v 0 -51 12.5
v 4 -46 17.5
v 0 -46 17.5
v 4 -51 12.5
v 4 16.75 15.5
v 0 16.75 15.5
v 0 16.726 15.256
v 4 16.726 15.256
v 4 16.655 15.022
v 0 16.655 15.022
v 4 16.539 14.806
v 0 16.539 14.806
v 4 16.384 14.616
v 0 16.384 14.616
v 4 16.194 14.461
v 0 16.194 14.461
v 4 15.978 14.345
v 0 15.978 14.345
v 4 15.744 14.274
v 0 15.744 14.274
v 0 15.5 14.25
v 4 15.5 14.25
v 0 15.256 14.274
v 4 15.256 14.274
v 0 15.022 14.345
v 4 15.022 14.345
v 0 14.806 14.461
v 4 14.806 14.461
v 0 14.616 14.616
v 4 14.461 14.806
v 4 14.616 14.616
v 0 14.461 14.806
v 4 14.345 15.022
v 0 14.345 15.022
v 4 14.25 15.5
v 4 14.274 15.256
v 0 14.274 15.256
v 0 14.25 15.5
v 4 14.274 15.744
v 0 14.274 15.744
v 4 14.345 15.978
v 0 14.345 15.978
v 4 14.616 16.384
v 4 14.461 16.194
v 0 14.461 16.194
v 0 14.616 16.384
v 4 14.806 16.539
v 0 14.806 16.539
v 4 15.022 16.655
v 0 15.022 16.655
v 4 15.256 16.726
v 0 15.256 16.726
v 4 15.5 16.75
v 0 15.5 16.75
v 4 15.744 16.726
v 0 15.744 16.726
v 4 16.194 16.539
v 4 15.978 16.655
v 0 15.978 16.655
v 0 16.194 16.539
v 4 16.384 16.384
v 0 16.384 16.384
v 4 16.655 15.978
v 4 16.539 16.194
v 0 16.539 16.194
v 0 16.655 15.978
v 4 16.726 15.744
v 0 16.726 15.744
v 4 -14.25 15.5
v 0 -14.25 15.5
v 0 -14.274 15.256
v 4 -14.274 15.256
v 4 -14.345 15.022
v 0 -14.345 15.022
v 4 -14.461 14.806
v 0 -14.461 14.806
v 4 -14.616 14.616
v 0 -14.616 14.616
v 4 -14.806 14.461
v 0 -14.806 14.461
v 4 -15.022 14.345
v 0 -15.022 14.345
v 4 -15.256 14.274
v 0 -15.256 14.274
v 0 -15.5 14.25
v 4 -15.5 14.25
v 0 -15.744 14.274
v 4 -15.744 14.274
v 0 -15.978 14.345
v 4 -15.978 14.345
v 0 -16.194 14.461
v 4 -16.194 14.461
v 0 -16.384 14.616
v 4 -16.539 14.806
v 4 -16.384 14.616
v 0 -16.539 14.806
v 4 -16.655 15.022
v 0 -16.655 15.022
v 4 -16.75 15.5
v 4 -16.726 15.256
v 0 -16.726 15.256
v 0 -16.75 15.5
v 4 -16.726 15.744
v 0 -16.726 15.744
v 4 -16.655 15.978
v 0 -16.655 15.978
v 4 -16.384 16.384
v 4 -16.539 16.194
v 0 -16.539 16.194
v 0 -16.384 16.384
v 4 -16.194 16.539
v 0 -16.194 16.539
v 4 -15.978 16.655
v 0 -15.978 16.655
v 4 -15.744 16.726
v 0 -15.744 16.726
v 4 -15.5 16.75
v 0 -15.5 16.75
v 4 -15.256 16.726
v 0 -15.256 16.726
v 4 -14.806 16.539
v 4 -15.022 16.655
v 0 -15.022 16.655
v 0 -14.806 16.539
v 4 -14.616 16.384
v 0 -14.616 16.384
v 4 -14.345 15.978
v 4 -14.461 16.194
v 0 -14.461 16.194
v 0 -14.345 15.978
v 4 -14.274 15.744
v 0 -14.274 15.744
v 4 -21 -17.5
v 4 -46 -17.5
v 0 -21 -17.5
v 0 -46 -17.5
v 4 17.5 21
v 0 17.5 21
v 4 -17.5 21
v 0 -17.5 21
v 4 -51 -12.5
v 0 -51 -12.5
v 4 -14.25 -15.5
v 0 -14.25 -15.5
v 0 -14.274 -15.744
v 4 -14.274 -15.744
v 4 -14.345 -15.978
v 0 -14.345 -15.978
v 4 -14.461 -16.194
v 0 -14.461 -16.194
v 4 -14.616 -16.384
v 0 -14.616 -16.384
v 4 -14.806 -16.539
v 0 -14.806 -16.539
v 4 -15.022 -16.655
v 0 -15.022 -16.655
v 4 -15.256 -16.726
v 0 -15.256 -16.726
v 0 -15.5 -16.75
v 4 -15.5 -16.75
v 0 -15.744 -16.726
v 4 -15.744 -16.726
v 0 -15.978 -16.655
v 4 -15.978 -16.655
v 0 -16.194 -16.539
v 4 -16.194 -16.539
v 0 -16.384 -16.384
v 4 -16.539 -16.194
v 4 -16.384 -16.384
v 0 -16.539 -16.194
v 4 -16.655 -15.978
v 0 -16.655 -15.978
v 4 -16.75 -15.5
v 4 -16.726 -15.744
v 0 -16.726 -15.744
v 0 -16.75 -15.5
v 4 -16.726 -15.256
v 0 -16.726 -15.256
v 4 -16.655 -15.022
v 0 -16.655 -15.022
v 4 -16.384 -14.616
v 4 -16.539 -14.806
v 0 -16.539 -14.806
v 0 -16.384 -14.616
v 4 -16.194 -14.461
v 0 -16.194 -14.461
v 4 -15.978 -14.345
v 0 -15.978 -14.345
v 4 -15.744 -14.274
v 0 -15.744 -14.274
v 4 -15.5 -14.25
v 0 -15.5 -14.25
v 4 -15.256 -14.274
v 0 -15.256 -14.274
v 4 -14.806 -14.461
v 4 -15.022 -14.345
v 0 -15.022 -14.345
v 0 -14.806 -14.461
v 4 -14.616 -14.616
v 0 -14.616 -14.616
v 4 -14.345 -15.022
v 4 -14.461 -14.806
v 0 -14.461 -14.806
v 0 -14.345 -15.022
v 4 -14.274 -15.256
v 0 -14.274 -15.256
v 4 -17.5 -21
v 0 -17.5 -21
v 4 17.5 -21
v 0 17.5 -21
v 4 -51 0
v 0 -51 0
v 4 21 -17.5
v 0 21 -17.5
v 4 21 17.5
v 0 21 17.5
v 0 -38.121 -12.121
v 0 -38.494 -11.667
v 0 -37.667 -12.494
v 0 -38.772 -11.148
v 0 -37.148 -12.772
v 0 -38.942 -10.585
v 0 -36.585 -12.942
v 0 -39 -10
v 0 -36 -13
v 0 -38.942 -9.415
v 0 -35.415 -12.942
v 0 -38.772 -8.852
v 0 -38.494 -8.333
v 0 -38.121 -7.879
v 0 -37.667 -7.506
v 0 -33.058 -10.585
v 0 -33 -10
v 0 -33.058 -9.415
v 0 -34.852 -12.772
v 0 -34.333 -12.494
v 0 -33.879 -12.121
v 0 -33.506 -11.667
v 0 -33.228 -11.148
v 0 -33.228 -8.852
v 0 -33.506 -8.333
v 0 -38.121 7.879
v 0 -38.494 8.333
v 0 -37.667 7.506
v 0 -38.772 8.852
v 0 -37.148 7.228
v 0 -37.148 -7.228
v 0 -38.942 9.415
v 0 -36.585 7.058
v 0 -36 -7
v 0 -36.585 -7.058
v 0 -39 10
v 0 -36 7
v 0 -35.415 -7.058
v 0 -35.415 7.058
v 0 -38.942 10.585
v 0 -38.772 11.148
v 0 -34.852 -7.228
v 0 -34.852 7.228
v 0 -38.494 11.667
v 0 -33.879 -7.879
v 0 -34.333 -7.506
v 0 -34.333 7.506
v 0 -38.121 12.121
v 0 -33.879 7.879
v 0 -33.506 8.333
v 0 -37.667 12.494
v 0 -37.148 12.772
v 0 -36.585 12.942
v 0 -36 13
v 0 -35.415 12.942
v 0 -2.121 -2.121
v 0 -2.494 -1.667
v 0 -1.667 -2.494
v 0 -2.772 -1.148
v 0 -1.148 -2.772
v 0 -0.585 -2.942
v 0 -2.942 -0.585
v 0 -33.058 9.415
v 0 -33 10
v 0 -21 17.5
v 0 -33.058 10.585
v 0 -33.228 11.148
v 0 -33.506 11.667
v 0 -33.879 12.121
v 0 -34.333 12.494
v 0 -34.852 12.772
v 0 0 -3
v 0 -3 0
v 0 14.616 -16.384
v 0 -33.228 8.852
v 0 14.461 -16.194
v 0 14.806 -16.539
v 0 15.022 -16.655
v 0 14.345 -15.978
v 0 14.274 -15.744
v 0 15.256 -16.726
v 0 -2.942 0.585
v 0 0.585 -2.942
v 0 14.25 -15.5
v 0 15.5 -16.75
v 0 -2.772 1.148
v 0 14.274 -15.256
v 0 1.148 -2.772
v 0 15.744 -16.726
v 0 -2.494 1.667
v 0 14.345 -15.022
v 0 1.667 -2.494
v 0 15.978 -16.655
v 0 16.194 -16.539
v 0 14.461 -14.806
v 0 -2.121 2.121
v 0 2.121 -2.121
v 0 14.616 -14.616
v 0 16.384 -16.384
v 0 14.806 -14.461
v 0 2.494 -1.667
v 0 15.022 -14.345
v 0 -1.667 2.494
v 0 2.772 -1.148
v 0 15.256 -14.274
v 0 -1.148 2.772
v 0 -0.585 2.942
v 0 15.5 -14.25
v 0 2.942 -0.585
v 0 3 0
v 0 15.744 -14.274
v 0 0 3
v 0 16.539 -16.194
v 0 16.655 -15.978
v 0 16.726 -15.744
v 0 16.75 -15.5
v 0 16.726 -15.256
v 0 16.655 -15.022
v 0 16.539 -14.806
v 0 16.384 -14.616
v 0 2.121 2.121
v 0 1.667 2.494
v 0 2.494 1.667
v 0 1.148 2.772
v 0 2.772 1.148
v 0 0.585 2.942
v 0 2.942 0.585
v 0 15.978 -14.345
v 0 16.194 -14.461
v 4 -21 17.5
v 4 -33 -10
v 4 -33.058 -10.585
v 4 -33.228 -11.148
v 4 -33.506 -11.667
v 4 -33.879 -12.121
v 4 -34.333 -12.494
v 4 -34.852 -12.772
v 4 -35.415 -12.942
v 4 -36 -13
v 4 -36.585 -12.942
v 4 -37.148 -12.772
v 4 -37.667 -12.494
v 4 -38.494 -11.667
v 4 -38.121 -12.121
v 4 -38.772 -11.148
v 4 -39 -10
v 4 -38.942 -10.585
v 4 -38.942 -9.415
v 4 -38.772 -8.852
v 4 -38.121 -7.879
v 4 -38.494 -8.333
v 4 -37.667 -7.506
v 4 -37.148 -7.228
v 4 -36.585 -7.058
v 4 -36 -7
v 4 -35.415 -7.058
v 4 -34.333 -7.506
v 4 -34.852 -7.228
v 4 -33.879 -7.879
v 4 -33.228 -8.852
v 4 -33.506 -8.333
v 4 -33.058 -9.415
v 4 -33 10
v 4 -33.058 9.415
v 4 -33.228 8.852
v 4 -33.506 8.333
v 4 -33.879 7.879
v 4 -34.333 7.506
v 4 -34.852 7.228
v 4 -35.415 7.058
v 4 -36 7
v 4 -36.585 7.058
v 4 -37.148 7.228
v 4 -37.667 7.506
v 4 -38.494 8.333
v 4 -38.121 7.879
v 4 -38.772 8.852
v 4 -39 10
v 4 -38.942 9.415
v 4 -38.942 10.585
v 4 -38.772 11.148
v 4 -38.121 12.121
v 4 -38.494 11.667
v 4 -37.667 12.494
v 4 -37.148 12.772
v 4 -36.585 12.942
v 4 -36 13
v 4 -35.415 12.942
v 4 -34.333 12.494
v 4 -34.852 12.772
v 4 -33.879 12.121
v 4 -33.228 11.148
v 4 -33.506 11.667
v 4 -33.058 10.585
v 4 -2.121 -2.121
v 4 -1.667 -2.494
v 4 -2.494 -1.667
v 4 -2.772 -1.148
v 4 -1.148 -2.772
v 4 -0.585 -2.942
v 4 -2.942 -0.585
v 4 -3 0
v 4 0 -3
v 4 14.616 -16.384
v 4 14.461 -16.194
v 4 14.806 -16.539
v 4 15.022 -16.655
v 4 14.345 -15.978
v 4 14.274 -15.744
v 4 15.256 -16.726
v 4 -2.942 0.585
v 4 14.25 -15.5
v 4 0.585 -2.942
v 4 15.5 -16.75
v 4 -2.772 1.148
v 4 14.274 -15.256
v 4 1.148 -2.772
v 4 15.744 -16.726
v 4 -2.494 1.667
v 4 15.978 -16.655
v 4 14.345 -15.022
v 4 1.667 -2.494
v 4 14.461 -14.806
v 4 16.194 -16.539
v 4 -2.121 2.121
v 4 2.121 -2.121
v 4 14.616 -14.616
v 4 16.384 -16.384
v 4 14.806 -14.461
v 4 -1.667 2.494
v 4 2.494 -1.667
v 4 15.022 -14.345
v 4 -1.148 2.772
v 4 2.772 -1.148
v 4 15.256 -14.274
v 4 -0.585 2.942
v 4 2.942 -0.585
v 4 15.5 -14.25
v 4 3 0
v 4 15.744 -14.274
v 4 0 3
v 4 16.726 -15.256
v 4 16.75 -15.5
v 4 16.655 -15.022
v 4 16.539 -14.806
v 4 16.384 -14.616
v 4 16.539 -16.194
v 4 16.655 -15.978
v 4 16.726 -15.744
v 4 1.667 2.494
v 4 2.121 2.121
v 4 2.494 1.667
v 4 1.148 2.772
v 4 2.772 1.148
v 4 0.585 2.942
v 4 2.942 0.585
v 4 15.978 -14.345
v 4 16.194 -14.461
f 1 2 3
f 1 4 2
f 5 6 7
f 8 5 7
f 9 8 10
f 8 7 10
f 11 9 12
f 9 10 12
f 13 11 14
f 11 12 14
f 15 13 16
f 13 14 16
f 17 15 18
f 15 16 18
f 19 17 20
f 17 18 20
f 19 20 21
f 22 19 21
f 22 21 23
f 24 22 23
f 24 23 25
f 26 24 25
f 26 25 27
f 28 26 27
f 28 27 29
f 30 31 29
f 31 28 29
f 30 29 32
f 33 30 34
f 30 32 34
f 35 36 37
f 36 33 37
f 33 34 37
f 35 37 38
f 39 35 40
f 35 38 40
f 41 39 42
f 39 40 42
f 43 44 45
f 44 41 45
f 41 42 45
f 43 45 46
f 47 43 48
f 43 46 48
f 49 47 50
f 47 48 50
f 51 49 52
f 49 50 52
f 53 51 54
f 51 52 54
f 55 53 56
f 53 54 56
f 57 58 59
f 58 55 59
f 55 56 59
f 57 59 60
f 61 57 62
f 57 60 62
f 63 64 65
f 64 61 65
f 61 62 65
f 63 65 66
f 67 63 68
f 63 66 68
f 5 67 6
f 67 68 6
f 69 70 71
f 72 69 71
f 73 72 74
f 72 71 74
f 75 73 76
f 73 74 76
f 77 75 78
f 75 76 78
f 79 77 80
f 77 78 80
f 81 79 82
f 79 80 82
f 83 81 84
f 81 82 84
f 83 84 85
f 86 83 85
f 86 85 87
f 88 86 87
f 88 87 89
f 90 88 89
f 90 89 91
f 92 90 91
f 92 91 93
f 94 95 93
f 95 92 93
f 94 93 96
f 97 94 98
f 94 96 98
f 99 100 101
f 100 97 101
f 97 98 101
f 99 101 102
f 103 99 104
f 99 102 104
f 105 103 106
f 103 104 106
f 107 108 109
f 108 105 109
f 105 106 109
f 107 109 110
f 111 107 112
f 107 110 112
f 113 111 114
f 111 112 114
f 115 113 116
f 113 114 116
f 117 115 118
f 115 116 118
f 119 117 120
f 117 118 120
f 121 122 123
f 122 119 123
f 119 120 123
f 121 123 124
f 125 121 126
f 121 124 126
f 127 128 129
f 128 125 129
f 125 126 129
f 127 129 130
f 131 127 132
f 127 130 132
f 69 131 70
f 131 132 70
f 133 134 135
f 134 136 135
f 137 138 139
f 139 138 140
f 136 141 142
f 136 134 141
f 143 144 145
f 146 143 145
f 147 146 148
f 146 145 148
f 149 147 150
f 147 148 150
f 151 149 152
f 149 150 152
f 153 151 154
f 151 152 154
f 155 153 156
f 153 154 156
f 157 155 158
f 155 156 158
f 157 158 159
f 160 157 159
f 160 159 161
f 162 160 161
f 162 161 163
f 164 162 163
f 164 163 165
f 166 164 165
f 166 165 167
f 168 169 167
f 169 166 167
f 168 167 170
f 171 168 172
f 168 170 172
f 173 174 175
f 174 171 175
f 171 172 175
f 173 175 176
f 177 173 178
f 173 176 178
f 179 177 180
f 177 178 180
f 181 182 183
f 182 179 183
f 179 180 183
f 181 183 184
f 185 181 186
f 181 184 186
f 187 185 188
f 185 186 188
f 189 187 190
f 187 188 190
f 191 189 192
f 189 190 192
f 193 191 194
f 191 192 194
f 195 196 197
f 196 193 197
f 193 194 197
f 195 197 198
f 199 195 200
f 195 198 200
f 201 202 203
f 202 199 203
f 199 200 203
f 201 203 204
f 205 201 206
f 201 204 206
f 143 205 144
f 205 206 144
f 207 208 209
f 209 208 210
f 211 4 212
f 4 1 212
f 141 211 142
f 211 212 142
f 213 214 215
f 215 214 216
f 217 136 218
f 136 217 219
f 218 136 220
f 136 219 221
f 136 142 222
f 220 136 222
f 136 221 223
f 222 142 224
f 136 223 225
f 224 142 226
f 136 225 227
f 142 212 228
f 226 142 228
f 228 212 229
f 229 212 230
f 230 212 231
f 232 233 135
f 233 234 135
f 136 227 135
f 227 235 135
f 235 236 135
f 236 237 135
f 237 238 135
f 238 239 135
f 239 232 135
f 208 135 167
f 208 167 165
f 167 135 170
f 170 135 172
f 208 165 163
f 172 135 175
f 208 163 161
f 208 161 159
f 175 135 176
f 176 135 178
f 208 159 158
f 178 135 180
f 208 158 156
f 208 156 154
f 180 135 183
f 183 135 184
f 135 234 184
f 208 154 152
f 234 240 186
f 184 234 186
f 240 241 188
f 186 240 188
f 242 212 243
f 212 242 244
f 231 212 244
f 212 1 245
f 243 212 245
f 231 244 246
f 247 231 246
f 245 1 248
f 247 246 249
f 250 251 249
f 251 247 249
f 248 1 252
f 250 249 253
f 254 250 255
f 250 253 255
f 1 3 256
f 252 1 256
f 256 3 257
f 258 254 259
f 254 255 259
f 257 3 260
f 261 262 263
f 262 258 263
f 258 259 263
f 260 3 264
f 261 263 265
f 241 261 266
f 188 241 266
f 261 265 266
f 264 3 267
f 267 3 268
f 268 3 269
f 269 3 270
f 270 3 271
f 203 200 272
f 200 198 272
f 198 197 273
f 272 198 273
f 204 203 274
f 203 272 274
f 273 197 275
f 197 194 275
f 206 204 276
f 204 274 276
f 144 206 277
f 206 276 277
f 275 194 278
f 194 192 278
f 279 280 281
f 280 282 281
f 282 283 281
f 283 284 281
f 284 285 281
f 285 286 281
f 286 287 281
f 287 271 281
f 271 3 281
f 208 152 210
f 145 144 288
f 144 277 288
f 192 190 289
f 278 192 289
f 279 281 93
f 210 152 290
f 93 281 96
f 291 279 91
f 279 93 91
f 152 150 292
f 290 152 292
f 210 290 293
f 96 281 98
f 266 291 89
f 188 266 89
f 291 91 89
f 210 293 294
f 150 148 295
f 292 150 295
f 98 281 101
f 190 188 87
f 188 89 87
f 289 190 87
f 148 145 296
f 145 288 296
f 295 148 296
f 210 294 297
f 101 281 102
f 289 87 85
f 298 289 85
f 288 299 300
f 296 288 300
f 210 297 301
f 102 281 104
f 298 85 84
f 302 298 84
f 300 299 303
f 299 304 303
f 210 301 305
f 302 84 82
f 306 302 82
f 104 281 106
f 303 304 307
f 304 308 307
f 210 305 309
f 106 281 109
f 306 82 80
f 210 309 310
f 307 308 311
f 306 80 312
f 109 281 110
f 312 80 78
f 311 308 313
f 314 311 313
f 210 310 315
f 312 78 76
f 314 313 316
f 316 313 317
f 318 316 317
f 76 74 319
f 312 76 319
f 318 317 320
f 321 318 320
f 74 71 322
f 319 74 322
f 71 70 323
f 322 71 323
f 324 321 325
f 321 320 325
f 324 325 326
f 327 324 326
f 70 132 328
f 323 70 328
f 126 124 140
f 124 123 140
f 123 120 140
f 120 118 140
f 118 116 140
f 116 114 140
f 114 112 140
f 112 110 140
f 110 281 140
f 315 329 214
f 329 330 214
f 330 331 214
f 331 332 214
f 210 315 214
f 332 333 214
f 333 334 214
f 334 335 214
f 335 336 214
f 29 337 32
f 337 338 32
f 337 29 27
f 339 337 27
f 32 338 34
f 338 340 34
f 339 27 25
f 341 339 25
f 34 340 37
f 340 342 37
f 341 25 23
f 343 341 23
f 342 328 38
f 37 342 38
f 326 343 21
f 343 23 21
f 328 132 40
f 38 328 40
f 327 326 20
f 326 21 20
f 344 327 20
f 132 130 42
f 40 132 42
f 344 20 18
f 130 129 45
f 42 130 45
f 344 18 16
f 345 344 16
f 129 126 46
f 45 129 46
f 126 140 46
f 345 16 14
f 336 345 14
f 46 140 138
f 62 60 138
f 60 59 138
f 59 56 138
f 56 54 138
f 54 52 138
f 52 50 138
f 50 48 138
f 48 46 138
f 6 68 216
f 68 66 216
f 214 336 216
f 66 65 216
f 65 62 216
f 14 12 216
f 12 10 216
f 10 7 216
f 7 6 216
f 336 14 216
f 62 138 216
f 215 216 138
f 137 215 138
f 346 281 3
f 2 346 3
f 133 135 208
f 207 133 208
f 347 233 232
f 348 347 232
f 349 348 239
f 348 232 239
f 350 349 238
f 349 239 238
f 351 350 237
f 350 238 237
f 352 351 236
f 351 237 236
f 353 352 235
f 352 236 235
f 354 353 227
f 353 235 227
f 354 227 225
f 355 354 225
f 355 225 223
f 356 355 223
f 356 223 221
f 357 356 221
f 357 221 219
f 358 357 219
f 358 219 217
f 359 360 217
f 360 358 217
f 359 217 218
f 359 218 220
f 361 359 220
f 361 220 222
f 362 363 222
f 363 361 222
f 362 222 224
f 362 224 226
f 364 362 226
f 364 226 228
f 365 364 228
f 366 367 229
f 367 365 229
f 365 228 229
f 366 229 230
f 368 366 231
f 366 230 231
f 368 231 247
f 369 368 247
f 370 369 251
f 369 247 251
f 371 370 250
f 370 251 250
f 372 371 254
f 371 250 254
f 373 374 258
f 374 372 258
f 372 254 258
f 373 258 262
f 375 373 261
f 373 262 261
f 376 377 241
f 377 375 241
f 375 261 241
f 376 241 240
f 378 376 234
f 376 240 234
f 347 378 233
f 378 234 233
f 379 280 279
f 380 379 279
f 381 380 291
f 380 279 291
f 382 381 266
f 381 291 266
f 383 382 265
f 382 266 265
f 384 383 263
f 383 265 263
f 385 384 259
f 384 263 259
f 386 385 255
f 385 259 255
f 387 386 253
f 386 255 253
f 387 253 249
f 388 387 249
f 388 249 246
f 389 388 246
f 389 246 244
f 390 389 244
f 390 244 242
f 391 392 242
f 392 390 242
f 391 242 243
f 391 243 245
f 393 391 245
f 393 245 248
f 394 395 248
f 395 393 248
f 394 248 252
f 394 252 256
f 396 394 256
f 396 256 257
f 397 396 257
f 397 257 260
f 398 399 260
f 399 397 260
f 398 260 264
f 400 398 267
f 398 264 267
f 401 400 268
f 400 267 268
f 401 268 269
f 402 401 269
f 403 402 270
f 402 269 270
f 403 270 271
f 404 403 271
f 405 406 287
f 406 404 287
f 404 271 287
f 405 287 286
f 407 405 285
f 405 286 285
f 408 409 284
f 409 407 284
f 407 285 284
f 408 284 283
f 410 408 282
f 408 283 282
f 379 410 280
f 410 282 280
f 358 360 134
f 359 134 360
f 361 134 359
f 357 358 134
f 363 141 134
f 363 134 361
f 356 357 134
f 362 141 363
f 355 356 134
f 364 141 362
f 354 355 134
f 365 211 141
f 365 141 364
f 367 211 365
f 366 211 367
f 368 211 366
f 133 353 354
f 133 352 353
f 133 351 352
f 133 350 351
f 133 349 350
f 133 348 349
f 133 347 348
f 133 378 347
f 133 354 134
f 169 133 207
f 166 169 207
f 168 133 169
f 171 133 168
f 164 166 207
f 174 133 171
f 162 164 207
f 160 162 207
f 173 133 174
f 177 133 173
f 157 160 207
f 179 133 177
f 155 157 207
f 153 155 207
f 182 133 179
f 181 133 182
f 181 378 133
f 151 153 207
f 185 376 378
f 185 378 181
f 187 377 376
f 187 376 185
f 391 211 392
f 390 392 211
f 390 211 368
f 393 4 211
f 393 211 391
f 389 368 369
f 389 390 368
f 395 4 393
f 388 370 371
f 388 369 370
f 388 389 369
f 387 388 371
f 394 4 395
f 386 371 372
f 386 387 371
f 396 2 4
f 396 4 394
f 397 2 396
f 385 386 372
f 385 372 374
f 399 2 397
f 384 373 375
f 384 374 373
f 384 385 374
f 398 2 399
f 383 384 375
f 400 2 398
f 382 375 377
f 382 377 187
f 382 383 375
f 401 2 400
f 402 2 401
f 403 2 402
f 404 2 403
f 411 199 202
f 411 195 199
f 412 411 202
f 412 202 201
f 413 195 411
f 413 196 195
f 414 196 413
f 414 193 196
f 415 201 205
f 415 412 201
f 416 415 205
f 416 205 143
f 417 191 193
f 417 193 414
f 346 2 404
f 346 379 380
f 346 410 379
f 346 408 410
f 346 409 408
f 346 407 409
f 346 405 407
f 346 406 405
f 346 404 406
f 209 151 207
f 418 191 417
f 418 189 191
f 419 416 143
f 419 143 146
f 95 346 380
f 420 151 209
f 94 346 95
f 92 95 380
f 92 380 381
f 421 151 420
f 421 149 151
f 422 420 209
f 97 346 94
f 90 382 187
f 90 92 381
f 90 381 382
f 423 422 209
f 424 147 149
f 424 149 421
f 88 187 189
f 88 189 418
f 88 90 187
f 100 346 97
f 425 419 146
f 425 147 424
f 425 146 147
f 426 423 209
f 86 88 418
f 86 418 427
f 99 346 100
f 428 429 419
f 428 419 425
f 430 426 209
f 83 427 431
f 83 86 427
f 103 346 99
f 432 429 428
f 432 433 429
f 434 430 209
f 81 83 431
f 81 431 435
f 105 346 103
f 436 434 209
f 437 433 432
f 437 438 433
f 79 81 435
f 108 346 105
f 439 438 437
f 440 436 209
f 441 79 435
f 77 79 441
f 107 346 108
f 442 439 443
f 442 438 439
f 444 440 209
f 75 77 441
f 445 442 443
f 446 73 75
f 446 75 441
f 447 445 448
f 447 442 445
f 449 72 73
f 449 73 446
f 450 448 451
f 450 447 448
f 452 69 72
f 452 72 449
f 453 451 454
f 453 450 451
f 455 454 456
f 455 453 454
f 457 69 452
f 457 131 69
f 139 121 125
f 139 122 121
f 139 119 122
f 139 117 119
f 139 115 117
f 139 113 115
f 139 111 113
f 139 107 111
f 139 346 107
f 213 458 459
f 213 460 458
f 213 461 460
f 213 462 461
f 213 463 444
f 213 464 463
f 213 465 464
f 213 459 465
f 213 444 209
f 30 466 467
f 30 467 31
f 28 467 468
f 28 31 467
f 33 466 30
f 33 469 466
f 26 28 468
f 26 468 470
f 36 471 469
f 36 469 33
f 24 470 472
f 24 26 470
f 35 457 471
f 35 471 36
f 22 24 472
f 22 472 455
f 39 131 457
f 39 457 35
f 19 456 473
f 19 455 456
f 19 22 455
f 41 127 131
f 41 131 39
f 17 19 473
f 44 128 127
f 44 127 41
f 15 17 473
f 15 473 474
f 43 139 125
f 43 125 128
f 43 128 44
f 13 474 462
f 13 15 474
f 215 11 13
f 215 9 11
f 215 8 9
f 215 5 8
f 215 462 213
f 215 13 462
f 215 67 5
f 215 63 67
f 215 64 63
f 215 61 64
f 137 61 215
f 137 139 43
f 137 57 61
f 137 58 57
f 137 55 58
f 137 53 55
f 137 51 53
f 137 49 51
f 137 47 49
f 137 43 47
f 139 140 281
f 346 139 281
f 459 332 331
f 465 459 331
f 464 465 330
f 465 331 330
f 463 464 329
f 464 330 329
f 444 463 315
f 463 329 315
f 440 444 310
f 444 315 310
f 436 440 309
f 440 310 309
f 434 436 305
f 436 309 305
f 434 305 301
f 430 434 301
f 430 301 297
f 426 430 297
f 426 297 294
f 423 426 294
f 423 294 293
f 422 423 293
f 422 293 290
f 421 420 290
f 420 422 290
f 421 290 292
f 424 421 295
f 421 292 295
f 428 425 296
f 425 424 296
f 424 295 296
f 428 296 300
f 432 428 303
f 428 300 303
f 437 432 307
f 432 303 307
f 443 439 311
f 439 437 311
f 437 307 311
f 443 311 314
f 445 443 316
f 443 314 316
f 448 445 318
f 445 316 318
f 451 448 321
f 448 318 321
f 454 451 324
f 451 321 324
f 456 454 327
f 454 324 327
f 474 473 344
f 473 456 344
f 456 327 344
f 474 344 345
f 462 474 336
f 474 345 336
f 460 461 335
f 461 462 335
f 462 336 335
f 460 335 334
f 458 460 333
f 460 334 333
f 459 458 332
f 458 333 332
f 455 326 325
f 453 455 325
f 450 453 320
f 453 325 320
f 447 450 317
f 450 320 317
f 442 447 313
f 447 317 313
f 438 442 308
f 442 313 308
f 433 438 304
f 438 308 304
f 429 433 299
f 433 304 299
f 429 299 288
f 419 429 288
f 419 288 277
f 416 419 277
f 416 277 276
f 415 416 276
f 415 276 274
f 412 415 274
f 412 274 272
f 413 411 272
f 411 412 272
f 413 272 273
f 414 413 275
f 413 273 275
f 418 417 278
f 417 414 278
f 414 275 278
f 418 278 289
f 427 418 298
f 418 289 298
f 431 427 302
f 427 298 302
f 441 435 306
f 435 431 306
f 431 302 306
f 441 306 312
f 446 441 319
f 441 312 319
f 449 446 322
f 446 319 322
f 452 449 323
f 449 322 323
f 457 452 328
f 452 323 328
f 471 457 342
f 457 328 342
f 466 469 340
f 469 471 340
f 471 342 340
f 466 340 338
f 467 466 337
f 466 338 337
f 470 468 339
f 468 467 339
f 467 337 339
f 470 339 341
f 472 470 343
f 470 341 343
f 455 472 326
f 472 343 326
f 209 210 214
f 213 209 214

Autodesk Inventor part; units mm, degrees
ref_plane "YZ Plane" through (0, 0, 0) normal (1, 0, 0) x (0, 1, 0)
ref_plane "XZ Plane" through (0, 0, 0) normal (0, 1, 0) x (-1, 0, 0)
ref_plane "XY Plane" through (0, 0, 0) normal (0, 0, 1) x (1, 0, 0)
sketch "Эскиз1" plane through (0, 0, 0) normal (1, 0, 0) x (0, 1, 0)
  line L0 (-17.5, 21) -> (-21, 17.5)
  line L1 (-21, 17.5) -> (-21, -17.5)
  line L2 (-21, -17.5) -> (-17.5, -21)
  line L3 (-17.5, -21) -> (17.5, -21)
  line L4 (17.5, -21) -> (21, -17.5)
  line L5 (21, -17.5) -> (21, 17.5)
  line L6 (21, 17.5) -> (17.5, 21)
  line L7 (17.5, 21) -> (-17.5, 21)
  circle A0 centre (0, 0) radius 11.3
  circle A1 centre (-15.5, -15.5) radius 1.25
  circle A2 centre (15.5, -15.5) radius 1.25
  circle A3 centre (15.5, 15.5) radius 1.25
  circle A4 centre (-15.5, 15.5) radius 1.25
  line L8 (-21, 17.5) -> (-51, 17.5)
  line L9 (-51, 17.5) -> (-51, -17.5)
  line L10 (-51, -17.5) -> (-21, -17.5)
  line L11 (-21, -17.5) -> (-21, 17.5)
  line L12 (-51, 0) -> (-36, 0)
  line L13 (-36, 0) -> (-36, 10)
  line L14 (-36, 10) -> (-36, -10)
  circle A5 centre (-36, 10) radius 3
  circle A6 centre (-36, -10) radius 3
  circle A7 centre (0, 0) radius 3
  dimension "d0" = 30
  dimension "d1" = 15
  dimension "d2" = 10
  dimension "d3" = 20
  dimension "d4" = 6
  dimension "d5" = 6
  dimension "d6" = 6
extrude "Выдавливание1" add sketch "Эскиз1" along normal blind 4 contours L7 L6 L5 L4 L3 L2 L1 L0 | L1 L10 L9 L8 | A0
chamfer "Фаска1" distance 5 angle 45 2 edges at (2, -51, 17.5) (2, -51, -17.5)
properties part number "КВ33.044.002 - Держатель катка"
